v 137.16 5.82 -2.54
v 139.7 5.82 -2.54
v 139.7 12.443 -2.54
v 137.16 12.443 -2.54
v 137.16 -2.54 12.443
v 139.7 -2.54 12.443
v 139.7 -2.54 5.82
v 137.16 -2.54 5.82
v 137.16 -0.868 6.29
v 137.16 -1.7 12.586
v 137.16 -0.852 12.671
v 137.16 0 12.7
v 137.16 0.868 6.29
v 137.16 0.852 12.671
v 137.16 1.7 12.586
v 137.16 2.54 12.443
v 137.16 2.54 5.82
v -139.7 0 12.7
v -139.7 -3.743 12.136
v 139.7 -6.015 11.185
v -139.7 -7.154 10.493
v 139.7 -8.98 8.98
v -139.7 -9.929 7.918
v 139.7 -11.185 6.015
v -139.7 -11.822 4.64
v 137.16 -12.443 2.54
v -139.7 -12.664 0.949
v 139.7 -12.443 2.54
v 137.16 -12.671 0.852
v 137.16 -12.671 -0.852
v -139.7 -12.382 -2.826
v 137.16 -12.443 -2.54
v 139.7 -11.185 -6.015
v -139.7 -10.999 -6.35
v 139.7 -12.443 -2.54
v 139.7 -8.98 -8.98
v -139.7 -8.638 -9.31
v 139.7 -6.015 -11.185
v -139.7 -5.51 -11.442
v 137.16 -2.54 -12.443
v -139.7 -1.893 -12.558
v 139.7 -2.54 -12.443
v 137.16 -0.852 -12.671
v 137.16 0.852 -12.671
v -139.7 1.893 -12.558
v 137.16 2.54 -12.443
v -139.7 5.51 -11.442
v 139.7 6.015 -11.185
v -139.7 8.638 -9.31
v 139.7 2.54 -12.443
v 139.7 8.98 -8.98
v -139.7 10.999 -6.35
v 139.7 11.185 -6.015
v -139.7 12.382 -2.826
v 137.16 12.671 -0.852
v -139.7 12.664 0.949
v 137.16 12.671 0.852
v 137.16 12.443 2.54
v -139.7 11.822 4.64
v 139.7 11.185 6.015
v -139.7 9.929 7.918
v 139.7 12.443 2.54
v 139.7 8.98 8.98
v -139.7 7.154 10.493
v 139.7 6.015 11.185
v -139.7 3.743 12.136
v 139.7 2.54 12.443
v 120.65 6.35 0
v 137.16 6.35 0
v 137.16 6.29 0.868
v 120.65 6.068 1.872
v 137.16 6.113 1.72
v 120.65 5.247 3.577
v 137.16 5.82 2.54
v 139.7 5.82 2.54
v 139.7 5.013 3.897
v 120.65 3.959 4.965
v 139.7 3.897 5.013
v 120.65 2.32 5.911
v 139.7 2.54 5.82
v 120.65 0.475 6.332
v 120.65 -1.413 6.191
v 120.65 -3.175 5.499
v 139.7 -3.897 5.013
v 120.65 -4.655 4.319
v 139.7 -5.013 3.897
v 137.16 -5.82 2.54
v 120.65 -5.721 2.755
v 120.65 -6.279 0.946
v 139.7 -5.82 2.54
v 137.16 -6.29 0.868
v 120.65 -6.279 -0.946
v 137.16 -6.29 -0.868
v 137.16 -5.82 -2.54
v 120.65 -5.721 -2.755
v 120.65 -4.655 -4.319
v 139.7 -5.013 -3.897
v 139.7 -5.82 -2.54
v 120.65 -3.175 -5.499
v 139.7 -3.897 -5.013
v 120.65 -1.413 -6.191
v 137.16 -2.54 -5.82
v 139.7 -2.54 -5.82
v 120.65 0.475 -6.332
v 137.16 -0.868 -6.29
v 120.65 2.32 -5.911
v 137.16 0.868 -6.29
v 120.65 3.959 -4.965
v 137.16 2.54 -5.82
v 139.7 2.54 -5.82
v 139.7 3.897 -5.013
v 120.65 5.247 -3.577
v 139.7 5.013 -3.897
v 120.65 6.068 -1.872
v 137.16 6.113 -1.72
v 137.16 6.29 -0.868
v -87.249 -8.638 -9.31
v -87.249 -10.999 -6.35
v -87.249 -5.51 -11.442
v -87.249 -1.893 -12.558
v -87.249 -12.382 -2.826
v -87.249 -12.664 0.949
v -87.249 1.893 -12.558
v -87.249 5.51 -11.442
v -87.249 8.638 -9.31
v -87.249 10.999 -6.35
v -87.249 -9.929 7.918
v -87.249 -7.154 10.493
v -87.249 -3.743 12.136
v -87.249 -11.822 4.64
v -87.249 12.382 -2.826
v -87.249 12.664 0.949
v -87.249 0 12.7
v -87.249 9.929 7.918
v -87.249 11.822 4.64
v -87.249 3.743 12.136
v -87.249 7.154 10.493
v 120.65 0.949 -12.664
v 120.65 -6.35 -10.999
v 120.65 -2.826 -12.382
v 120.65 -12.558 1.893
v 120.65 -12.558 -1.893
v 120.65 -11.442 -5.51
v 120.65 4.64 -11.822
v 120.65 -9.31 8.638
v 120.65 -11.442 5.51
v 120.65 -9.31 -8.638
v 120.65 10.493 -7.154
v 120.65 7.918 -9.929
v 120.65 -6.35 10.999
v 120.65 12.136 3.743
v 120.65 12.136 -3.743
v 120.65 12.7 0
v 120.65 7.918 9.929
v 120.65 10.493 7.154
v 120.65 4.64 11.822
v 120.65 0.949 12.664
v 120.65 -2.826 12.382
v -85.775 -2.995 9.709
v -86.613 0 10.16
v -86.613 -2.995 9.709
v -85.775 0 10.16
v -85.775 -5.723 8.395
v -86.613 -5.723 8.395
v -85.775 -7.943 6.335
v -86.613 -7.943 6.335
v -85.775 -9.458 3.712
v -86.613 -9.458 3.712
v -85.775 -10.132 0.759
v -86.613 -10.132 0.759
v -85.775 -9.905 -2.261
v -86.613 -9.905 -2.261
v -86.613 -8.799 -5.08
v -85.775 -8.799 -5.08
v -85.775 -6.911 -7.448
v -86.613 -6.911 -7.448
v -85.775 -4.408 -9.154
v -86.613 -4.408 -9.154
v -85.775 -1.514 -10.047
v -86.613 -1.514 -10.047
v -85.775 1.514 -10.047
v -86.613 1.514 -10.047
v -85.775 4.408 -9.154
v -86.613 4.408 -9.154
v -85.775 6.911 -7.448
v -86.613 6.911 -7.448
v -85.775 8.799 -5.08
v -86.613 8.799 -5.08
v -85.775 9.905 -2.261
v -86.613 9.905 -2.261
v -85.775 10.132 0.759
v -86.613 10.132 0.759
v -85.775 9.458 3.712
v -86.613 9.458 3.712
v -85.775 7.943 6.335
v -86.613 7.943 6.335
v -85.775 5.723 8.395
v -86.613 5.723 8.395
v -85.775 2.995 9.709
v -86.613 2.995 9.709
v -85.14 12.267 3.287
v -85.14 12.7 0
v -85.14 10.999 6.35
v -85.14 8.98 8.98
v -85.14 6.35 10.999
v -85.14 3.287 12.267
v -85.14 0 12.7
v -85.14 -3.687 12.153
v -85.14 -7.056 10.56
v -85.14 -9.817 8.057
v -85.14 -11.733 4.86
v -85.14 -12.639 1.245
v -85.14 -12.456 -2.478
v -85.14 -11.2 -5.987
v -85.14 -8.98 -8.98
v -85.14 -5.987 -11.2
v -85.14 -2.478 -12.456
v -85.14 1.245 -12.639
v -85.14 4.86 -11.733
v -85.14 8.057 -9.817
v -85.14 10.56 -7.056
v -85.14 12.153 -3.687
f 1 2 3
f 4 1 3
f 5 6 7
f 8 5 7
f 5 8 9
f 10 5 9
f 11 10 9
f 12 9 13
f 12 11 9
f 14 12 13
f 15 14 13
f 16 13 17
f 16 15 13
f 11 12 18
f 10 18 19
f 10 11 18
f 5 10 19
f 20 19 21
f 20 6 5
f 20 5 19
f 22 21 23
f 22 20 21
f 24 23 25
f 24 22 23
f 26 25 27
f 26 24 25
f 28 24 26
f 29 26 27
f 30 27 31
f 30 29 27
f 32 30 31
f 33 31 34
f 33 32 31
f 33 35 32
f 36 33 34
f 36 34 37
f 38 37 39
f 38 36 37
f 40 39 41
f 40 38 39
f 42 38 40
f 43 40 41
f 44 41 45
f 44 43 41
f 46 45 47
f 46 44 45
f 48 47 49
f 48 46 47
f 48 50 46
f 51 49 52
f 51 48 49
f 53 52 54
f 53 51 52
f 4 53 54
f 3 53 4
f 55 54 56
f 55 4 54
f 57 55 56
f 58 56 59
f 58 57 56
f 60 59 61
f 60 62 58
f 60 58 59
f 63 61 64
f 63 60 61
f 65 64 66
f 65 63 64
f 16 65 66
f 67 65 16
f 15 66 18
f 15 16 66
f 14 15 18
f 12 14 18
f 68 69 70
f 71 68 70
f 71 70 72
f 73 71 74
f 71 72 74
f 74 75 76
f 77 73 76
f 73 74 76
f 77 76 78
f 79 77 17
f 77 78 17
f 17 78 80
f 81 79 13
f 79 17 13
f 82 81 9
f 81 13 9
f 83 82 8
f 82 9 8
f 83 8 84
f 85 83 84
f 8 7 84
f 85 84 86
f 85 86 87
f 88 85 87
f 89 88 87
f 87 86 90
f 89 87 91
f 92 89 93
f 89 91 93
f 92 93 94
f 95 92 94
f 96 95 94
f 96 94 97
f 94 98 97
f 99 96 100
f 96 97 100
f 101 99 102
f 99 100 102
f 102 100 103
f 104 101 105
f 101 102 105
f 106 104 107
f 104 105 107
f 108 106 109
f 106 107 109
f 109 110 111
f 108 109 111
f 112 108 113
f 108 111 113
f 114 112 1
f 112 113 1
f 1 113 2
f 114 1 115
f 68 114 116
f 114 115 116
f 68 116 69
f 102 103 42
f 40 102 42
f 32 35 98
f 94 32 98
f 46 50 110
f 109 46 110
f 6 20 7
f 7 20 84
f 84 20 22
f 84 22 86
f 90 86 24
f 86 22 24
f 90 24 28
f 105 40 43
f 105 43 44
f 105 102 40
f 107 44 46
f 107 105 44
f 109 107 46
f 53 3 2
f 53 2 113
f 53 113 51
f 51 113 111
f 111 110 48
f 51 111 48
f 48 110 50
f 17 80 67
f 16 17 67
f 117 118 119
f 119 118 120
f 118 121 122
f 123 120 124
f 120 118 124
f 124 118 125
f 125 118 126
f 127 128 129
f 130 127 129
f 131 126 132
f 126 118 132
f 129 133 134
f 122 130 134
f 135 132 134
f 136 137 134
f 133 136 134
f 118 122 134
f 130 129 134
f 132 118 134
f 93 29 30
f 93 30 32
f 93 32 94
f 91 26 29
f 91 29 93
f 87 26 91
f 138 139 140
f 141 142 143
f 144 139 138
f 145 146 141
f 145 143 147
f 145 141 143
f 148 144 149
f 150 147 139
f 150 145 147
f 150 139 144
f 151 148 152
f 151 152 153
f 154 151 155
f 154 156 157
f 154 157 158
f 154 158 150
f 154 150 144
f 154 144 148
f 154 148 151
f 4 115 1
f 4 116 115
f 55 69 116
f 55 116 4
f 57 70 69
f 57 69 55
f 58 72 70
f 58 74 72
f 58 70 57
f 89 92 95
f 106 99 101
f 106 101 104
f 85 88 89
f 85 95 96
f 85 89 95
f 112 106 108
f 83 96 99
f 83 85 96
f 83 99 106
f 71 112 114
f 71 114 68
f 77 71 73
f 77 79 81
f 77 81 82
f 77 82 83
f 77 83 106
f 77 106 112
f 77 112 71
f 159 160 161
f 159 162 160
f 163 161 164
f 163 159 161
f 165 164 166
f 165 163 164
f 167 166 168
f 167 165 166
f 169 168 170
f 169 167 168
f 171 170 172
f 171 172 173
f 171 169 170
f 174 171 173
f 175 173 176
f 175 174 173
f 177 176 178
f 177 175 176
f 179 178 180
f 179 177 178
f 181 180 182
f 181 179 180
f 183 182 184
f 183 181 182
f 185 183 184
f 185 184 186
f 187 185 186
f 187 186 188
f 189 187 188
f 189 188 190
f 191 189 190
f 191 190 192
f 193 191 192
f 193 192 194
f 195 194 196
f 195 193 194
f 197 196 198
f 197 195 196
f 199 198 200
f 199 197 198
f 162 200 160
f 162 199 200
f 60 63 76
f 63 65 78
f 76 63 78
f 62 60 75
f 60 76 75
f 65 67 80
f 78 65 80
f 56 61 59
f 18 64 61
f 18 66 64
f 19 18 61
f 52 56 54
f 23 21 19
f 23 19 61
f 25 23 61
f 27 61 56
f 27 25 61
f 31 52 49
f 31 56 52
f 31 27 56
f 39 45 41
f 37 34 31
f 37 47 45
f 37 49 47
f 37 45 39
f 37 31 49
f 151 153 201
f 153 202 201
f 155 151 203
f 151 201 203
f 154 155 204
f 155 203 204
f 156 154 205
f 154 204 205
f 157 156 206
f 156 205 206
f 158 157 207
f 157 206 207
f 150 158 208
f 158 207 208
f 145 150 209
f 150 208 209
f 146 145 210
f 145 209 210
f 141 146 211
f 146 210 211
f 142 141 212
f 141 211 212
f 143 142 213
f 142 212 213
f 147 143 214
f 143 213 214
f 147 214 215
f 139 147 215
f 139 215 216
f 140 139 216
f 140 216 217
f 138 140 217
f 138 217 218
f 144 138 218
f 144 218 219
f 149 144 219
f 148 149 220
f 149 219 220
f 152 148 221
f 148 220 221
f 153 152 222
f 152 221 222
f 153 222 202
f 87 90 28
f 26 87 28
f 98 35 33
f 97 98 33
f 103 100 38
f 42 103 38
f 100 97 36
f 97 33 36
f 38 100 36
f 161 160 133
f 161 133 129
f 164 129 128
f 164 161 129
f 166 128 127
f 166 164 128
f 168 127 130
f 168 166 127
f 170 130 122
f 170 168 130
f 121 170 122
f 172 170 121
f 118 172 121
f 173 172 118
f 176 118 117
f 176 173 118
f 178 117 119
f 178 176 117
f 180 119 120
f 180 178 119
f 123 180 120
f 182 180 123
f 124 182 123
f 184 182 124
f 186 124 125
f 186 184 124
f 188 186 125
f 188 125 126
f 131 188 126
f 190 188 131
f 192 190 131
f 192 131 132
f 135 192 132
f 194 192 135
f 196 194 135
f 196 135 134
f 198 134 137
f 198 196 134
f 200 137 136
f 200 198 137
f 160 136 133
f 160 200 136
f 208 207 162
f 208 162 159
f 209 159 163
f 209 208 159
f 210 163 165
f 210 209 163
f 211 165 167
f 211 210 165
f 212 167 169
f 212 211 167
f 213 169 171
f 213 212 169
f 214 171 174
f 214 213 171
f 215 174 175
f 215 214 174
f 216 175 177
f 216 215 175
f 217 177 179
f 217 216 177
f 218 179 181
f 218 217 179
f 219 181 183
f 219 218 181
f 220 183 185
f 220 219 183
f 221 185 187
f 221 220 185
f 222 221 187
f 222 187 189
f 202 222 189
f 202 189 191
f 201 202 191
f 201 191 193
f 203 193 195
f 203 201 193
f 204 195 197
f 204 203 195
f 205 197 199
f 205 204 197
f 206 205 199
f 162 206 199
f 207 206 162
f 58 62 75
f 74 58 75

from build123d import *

# Parameters (mm, degrees)
F0_W           = 279.4
F0_H           = 12.7
F3_R           = 6.35
F4_DEPTH       = 44.45
F6_DEPTH       = 2.54
F8_DEPTH       = 2.54
F9_R           = 12.7
F10_DEPTH      = 87.249
F10_DEPTH_BACK = 120.65


with BuildPart() as f1:
    # F0 (on Front) → F1 (revolve)
    with BuildSketch(Plane.XZ):
        with Locations((0, 6.35)):
            Rectangle(F0_W, F0_H)
    revolve(axis=Axis((-13.8321295381, 0, 0), (1, 0, 0)))

    # F3 (on offset) → F4 (cut)
    with BuildSketch(Plane.YZ.offset(165.1)):
        Circle(F3_R)
    extrude(amount=-F4_DEPTH, mode=Mode.SUBTRACT)

    # F5 (on face) → F6 (cut)
    with BuildSketch(Plane.YZ.offset(139.7)):
        with BuildLine():
            Line((12.4434078933, 2.54), (-12.4434078933, 2.54))
            ThreePointArc((-12.4434078933, 2.54), (-14.9834078933, 0), (-12.4434078933, -2.54))
            Line((-12.4434078933, -2.54), (12.4434078933, -2.54))
            ThreePointArc((12.4434078933, -2.54), (14.9834078933, 0), (12.4434078933, 2.54))
        make_face()
    extrude(amount=-F6_DEPTH, mode=Mode.SUBTRACT)

    # F7 (on face) → F8 (cut)
    with BuildSketch(Plane.YZ.offset(139.7)):
        with BuildLine():
            Line((2.54, -12.4434078933), (2.54, 12.4434078933))
            ThreePointArc((2.54, 12.4434078933), (0, 14.9834078933), (-2.54, 12.4434078933))
            Line((-2.54, 12.4434078933), (-2.54, -12.4434078933))
            ThreePointArc((-2.54, -12.4434078933), (0, -14.9834078933), (2.54, -12.4434078933))
        make_face()
    extrude(amount=-F8_DEPTH, mode=Mode.SUBTRACT)


with BuildPart() as f10:
    # F9 (on Right) → F10 (new body, two sides)
    with BuildSketch(Plane.YZ) as f10_sk:
        Circle(F9_R)
    extrude(amount=-F10_DEPTH)
    extrude(f10_sk.sketch, amount=F10_DEPTH_BACK)

    # F11 (on Front) → F12 (revolve, cut)
    with BuildSketch(Plane.XZ):
        Polygon((-87.249, 12.7), (-86.613352, 10.16), (-85.7752920052, 10.16), (-85.1396440051, 12.7), align=None)
    revolve(axis=Axis((-13.8321295381, 0, 0), (1, 0, 0)), mode=Mode.SUBTRACT)


solid = Compound([f1.part, f10.part])
